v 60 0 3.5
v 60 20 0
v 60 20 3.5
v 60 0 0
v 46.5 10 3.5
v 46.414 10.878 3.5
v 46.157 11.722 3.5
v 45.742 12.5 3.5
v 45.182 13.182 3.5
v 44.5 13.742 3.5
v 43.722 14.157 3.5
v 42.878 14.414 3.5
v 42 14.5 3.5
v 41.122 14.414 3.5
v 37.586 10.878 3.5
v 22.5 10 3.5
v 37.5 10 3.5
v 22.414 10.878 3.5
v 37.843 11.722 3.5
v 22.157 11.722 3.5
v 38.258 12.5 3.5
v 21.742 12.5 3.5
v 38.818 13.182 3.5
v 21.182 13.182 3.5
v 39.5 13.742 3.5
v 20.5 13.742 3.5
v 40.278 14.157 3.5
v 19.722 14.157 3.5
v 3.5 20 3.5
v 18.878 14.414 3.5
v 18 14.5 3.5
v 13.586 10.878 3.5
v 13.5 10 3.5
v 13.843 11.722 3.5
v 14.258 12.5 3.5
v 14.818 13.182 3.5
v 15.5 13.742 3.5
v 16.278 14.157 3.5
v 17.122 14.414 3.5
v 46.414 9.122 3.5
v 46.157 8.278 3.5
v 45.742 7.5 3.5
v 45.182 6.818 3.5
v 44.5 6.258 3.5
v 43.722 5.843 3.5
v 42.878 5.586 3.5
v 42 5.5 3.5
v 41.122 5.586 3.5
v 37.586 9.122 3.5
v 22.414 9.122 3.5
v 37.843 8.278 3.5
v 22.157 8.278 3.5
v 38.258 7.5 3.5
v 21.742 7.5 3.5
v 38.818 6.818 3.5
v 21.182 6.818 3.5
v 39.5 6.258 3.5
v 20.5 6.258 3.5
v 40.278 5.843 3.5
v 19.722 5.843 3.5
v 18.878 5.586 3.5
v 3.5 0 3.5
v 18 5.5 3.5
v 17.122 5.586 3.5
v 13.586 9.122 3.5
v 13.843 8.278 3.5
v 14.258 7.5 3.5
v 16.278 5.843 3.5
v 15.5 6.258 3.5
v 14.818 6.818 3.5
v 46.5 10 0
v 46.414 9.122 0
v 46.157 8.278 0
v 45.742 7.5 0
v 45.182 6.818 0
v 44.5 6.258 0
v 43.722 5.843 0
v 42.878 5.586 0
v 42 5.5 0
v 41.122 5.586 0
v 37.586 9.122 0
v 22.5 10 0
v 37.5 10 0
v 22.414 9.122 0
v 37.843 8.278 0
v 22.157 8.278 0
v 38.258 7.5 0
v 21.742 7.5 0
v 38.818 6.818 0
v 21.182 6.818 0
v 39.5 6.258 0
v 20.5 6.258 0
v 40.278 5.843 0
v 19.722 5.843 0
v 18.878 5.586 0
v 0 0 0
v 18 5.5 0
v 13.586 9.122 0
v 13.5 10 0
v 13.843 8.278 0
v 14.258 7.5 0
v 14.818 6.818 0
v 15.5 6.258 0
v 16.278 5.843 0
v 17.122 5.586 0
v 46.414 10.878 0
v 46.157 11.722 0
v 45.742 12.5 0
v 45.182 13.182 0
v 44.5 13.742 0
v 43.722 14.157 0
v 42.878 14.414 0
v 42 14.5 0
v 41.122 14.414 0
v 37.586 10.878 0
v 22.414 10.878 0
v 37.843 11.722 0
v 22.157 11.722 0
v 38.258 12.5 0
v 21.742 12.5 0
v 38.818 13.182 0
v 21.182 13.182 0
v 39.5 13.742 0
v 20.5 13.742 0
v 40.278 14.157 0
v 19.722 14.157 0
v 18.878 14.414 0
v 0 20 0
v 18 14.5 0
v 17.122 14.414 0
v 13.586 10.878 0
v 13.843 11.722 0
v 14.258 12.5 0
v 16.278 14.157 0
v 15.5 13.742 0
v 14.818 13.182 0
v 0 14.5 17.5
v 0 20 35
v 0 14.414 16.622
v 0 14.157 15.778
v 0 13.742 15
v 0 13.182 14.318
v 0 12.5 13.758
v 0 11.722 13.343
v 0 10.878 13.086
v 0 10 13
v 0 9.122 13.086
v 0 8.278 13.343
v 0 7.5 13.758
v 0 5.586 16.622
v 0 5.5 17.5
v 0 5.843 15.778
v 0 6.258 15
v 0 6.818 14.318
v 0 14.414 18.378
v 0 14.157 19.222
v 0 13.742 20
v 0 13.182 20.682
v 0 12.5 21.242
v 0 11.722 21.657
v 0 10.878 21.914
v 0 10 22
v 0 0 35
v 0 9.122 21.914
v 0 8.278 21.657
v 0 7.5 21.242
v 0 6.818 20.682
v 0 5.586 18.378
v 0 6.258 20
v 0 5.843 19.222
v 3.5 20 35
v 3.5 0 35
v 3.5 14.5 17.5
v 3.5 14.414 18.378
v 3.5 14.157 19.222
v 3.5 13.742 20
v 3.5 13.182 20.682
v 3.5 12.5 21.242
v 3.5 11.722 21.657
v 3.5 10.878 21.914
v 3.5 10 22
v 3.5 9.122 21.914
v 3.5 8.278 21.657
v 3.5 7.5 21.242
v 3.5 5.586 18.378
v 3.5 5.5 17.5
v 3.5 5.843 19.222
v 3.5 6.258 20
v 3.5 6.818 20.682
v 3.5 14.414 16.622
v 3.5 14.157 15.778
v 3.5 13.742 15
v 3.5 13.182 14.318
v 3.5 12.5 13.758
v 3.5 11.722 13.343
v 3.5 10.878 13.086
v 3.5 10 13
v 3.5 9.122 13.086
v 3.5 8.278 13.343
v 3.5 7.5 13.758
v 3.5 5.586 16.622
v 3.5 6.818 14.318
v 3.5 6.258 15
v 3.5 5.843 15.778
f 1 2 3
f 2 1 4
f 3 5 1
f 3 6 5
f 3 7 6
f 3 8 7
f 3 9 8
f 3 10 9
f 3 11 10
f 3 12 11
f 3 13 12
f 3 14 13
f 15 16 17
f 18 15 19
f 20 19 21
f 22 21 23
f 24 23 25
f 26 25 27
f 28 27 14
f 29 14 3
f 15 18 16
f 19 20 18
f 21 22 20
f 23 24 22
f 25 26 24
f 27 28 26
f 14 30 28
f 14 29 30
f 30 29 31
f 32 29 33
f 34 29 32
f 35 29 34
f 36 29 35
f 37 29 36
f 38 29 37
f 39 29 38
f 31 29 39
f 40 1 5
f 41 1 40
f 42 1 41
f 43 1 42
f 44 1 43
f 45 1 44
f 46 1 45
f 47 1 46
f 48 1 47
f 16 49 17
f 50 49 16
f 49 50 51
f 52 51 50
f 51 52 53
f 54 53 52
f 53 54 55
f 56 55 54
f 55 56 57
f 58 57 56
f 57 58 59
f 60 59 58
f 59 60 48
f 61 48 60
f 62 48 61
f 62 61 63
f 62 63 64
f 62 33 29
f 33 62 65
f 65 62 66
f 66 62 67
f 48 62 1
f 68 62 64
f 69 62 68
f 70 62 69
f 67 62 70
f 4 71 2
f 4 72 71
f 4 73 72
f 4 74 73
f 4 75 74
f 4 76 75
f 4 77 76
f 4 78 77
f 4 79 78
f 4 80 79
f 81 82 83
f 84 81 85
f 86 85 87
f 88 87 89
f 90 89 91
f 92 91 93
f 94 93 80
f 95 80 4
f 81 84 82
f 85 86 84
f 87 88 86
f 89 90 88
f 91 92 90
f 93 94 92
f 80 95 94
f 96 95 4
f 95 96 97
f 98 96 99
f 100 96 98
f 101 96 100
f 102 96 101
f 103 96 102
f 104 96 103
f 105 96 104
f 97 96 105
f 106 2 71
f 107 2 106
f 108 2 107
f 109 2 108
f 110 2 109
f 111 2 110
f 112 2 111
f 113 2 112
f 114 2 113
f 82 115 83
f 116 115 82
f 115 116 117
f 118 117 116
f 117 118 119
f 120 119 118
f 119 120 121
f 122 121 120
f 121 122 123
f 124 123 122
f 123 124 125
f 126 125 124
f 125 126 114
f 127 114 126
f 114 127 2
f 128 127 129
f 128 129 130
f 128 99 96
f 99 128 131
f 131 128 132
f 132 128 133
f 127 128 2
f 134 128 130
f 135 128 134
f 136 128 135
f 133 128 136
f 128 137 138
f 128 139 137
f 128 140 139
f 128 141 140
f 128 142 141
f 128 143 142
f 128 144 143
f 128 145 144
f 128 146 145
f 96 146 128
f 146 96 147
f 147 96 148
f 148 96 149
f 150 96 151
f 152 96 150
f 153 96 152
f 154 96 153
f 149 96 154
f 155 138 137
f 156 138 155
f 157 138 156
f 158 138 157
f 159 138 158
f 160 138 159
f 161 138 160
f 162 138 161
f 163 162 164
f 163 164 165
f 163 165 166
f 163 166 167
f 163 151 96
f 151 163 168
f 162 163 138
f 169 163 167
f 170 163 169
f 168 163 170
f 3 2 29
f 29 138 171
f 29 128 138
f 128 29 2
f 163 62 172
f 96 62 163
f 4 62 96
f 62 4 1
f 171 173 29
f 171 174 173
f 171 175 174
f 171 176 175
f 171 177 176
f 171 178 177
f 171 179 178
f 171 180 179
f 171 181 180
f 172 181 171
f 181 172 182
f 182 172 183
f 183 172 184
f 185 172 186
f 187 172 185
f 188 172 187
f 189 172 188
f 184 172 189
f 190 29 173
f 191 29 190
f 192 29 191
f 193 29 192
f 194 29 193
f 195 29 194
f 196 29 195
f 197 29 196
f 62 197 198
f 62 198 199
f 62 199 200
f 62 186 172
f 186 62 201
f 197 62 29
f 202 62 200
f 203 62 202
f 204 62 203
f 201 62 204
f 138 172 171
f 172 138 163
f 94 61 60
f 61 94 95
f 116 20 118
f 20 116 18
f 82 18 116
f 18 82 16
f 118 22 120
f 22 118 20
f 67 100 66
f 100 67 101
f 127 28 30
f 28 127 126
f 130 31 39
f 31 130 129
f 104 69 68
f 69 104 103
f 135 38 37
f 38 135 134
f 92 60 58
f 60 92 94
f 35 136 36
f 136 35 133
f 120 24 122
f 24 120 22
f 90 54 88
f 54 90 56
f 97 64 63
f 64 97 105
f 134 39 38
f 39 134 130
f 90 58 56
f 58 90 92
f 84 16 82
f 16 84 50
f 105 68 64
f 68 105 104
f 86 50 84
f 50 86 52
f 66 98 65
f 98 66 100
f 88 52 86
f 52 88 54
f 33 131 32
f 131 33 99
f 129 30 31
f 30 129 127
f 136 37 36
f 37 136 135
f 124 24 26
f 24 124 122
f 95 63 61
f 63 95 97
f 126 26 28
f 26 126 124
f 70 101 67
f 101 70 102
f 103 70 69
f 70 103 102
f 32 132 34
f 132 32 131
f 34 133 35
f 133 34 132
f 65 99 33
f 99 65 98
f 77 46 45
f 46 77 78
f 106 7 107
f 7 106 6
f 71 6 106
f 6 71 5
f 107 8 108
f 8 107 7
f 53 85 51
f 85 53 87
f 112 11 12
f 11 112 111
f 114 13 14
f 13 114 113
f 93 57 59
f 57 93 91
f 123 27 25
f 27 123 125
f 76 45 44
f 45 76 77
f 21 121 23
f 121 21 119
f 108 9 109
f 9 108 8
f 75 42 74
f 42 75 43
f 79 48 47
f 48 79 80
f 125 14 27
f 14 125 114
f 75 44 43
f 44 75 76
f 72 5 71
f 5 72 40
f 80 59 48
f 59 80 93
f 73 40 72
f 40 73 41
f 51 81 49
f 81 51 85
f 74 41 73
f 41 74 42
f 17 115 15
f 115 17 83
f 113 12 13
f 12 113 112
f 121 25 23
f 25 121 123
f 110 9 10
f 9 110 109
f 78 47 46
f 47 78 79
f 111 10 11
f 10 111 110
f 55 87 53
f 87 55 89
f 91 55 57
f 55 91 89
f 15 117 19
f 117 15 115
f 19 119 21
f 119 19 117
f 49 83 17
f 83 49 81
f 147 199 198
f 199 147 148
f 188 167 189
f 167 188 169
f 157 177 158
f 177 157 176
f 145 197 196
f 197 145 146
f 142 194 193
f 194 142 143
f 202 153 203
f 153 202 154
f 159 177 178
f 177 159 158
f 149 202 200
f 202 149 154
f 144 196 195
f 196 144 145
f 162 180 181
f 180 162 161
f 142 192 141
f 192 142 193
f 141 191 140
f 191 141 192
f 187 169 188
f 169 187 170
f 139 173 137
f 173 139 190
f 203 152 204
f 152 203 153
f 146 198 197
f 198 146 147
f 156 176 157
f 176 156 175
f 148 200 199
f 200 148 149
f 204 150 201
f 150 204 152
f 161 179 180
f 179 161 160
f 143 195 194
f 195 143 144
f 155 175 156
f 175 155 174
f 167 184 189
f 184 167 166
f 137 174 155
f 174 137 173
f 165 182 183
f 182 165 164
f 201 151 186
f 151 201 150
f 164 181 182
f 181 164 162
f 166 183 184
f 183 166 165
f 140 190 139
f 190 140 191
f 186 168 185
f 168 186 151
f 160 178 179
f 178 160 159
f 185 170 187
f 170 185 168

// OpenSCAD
$fn = 32;

// ----------------------------------------------------------------------
// L-bracket: 60 x 20 x 35 mm
// ----------------------------------------------------------------------

// --- parameters (mm) ---
leg_a = 60;               // horizontal leg, X
leg_b = 35;               // vertical leg, Z
depth = 20;               // bracket depth, Y
thick = 3.5;              // plate thickness
hole_d = 9;               // clearance for M8

module hole_z(px, py) {
  translate([px, py, -2.5]) cylinder(h = thick + 5, d = hole_d);
}
module hole_x(pz, py) {
  translate([-2.5, py, pz]) rotate([0, 90, 0]) cylinder(h = thick + 5, d = hole_d);
}

difference() {
  union() {
    /* horizontal leg */
    cube([leg_a, depth, thick]);
    /* vertical leg, overlapping the corner block */
    cube([thick, depth, leg_b]);
  }
  hole_z(18, 10);
  hole_z(42, 10);
  hole_x(17.5, 10);
}
